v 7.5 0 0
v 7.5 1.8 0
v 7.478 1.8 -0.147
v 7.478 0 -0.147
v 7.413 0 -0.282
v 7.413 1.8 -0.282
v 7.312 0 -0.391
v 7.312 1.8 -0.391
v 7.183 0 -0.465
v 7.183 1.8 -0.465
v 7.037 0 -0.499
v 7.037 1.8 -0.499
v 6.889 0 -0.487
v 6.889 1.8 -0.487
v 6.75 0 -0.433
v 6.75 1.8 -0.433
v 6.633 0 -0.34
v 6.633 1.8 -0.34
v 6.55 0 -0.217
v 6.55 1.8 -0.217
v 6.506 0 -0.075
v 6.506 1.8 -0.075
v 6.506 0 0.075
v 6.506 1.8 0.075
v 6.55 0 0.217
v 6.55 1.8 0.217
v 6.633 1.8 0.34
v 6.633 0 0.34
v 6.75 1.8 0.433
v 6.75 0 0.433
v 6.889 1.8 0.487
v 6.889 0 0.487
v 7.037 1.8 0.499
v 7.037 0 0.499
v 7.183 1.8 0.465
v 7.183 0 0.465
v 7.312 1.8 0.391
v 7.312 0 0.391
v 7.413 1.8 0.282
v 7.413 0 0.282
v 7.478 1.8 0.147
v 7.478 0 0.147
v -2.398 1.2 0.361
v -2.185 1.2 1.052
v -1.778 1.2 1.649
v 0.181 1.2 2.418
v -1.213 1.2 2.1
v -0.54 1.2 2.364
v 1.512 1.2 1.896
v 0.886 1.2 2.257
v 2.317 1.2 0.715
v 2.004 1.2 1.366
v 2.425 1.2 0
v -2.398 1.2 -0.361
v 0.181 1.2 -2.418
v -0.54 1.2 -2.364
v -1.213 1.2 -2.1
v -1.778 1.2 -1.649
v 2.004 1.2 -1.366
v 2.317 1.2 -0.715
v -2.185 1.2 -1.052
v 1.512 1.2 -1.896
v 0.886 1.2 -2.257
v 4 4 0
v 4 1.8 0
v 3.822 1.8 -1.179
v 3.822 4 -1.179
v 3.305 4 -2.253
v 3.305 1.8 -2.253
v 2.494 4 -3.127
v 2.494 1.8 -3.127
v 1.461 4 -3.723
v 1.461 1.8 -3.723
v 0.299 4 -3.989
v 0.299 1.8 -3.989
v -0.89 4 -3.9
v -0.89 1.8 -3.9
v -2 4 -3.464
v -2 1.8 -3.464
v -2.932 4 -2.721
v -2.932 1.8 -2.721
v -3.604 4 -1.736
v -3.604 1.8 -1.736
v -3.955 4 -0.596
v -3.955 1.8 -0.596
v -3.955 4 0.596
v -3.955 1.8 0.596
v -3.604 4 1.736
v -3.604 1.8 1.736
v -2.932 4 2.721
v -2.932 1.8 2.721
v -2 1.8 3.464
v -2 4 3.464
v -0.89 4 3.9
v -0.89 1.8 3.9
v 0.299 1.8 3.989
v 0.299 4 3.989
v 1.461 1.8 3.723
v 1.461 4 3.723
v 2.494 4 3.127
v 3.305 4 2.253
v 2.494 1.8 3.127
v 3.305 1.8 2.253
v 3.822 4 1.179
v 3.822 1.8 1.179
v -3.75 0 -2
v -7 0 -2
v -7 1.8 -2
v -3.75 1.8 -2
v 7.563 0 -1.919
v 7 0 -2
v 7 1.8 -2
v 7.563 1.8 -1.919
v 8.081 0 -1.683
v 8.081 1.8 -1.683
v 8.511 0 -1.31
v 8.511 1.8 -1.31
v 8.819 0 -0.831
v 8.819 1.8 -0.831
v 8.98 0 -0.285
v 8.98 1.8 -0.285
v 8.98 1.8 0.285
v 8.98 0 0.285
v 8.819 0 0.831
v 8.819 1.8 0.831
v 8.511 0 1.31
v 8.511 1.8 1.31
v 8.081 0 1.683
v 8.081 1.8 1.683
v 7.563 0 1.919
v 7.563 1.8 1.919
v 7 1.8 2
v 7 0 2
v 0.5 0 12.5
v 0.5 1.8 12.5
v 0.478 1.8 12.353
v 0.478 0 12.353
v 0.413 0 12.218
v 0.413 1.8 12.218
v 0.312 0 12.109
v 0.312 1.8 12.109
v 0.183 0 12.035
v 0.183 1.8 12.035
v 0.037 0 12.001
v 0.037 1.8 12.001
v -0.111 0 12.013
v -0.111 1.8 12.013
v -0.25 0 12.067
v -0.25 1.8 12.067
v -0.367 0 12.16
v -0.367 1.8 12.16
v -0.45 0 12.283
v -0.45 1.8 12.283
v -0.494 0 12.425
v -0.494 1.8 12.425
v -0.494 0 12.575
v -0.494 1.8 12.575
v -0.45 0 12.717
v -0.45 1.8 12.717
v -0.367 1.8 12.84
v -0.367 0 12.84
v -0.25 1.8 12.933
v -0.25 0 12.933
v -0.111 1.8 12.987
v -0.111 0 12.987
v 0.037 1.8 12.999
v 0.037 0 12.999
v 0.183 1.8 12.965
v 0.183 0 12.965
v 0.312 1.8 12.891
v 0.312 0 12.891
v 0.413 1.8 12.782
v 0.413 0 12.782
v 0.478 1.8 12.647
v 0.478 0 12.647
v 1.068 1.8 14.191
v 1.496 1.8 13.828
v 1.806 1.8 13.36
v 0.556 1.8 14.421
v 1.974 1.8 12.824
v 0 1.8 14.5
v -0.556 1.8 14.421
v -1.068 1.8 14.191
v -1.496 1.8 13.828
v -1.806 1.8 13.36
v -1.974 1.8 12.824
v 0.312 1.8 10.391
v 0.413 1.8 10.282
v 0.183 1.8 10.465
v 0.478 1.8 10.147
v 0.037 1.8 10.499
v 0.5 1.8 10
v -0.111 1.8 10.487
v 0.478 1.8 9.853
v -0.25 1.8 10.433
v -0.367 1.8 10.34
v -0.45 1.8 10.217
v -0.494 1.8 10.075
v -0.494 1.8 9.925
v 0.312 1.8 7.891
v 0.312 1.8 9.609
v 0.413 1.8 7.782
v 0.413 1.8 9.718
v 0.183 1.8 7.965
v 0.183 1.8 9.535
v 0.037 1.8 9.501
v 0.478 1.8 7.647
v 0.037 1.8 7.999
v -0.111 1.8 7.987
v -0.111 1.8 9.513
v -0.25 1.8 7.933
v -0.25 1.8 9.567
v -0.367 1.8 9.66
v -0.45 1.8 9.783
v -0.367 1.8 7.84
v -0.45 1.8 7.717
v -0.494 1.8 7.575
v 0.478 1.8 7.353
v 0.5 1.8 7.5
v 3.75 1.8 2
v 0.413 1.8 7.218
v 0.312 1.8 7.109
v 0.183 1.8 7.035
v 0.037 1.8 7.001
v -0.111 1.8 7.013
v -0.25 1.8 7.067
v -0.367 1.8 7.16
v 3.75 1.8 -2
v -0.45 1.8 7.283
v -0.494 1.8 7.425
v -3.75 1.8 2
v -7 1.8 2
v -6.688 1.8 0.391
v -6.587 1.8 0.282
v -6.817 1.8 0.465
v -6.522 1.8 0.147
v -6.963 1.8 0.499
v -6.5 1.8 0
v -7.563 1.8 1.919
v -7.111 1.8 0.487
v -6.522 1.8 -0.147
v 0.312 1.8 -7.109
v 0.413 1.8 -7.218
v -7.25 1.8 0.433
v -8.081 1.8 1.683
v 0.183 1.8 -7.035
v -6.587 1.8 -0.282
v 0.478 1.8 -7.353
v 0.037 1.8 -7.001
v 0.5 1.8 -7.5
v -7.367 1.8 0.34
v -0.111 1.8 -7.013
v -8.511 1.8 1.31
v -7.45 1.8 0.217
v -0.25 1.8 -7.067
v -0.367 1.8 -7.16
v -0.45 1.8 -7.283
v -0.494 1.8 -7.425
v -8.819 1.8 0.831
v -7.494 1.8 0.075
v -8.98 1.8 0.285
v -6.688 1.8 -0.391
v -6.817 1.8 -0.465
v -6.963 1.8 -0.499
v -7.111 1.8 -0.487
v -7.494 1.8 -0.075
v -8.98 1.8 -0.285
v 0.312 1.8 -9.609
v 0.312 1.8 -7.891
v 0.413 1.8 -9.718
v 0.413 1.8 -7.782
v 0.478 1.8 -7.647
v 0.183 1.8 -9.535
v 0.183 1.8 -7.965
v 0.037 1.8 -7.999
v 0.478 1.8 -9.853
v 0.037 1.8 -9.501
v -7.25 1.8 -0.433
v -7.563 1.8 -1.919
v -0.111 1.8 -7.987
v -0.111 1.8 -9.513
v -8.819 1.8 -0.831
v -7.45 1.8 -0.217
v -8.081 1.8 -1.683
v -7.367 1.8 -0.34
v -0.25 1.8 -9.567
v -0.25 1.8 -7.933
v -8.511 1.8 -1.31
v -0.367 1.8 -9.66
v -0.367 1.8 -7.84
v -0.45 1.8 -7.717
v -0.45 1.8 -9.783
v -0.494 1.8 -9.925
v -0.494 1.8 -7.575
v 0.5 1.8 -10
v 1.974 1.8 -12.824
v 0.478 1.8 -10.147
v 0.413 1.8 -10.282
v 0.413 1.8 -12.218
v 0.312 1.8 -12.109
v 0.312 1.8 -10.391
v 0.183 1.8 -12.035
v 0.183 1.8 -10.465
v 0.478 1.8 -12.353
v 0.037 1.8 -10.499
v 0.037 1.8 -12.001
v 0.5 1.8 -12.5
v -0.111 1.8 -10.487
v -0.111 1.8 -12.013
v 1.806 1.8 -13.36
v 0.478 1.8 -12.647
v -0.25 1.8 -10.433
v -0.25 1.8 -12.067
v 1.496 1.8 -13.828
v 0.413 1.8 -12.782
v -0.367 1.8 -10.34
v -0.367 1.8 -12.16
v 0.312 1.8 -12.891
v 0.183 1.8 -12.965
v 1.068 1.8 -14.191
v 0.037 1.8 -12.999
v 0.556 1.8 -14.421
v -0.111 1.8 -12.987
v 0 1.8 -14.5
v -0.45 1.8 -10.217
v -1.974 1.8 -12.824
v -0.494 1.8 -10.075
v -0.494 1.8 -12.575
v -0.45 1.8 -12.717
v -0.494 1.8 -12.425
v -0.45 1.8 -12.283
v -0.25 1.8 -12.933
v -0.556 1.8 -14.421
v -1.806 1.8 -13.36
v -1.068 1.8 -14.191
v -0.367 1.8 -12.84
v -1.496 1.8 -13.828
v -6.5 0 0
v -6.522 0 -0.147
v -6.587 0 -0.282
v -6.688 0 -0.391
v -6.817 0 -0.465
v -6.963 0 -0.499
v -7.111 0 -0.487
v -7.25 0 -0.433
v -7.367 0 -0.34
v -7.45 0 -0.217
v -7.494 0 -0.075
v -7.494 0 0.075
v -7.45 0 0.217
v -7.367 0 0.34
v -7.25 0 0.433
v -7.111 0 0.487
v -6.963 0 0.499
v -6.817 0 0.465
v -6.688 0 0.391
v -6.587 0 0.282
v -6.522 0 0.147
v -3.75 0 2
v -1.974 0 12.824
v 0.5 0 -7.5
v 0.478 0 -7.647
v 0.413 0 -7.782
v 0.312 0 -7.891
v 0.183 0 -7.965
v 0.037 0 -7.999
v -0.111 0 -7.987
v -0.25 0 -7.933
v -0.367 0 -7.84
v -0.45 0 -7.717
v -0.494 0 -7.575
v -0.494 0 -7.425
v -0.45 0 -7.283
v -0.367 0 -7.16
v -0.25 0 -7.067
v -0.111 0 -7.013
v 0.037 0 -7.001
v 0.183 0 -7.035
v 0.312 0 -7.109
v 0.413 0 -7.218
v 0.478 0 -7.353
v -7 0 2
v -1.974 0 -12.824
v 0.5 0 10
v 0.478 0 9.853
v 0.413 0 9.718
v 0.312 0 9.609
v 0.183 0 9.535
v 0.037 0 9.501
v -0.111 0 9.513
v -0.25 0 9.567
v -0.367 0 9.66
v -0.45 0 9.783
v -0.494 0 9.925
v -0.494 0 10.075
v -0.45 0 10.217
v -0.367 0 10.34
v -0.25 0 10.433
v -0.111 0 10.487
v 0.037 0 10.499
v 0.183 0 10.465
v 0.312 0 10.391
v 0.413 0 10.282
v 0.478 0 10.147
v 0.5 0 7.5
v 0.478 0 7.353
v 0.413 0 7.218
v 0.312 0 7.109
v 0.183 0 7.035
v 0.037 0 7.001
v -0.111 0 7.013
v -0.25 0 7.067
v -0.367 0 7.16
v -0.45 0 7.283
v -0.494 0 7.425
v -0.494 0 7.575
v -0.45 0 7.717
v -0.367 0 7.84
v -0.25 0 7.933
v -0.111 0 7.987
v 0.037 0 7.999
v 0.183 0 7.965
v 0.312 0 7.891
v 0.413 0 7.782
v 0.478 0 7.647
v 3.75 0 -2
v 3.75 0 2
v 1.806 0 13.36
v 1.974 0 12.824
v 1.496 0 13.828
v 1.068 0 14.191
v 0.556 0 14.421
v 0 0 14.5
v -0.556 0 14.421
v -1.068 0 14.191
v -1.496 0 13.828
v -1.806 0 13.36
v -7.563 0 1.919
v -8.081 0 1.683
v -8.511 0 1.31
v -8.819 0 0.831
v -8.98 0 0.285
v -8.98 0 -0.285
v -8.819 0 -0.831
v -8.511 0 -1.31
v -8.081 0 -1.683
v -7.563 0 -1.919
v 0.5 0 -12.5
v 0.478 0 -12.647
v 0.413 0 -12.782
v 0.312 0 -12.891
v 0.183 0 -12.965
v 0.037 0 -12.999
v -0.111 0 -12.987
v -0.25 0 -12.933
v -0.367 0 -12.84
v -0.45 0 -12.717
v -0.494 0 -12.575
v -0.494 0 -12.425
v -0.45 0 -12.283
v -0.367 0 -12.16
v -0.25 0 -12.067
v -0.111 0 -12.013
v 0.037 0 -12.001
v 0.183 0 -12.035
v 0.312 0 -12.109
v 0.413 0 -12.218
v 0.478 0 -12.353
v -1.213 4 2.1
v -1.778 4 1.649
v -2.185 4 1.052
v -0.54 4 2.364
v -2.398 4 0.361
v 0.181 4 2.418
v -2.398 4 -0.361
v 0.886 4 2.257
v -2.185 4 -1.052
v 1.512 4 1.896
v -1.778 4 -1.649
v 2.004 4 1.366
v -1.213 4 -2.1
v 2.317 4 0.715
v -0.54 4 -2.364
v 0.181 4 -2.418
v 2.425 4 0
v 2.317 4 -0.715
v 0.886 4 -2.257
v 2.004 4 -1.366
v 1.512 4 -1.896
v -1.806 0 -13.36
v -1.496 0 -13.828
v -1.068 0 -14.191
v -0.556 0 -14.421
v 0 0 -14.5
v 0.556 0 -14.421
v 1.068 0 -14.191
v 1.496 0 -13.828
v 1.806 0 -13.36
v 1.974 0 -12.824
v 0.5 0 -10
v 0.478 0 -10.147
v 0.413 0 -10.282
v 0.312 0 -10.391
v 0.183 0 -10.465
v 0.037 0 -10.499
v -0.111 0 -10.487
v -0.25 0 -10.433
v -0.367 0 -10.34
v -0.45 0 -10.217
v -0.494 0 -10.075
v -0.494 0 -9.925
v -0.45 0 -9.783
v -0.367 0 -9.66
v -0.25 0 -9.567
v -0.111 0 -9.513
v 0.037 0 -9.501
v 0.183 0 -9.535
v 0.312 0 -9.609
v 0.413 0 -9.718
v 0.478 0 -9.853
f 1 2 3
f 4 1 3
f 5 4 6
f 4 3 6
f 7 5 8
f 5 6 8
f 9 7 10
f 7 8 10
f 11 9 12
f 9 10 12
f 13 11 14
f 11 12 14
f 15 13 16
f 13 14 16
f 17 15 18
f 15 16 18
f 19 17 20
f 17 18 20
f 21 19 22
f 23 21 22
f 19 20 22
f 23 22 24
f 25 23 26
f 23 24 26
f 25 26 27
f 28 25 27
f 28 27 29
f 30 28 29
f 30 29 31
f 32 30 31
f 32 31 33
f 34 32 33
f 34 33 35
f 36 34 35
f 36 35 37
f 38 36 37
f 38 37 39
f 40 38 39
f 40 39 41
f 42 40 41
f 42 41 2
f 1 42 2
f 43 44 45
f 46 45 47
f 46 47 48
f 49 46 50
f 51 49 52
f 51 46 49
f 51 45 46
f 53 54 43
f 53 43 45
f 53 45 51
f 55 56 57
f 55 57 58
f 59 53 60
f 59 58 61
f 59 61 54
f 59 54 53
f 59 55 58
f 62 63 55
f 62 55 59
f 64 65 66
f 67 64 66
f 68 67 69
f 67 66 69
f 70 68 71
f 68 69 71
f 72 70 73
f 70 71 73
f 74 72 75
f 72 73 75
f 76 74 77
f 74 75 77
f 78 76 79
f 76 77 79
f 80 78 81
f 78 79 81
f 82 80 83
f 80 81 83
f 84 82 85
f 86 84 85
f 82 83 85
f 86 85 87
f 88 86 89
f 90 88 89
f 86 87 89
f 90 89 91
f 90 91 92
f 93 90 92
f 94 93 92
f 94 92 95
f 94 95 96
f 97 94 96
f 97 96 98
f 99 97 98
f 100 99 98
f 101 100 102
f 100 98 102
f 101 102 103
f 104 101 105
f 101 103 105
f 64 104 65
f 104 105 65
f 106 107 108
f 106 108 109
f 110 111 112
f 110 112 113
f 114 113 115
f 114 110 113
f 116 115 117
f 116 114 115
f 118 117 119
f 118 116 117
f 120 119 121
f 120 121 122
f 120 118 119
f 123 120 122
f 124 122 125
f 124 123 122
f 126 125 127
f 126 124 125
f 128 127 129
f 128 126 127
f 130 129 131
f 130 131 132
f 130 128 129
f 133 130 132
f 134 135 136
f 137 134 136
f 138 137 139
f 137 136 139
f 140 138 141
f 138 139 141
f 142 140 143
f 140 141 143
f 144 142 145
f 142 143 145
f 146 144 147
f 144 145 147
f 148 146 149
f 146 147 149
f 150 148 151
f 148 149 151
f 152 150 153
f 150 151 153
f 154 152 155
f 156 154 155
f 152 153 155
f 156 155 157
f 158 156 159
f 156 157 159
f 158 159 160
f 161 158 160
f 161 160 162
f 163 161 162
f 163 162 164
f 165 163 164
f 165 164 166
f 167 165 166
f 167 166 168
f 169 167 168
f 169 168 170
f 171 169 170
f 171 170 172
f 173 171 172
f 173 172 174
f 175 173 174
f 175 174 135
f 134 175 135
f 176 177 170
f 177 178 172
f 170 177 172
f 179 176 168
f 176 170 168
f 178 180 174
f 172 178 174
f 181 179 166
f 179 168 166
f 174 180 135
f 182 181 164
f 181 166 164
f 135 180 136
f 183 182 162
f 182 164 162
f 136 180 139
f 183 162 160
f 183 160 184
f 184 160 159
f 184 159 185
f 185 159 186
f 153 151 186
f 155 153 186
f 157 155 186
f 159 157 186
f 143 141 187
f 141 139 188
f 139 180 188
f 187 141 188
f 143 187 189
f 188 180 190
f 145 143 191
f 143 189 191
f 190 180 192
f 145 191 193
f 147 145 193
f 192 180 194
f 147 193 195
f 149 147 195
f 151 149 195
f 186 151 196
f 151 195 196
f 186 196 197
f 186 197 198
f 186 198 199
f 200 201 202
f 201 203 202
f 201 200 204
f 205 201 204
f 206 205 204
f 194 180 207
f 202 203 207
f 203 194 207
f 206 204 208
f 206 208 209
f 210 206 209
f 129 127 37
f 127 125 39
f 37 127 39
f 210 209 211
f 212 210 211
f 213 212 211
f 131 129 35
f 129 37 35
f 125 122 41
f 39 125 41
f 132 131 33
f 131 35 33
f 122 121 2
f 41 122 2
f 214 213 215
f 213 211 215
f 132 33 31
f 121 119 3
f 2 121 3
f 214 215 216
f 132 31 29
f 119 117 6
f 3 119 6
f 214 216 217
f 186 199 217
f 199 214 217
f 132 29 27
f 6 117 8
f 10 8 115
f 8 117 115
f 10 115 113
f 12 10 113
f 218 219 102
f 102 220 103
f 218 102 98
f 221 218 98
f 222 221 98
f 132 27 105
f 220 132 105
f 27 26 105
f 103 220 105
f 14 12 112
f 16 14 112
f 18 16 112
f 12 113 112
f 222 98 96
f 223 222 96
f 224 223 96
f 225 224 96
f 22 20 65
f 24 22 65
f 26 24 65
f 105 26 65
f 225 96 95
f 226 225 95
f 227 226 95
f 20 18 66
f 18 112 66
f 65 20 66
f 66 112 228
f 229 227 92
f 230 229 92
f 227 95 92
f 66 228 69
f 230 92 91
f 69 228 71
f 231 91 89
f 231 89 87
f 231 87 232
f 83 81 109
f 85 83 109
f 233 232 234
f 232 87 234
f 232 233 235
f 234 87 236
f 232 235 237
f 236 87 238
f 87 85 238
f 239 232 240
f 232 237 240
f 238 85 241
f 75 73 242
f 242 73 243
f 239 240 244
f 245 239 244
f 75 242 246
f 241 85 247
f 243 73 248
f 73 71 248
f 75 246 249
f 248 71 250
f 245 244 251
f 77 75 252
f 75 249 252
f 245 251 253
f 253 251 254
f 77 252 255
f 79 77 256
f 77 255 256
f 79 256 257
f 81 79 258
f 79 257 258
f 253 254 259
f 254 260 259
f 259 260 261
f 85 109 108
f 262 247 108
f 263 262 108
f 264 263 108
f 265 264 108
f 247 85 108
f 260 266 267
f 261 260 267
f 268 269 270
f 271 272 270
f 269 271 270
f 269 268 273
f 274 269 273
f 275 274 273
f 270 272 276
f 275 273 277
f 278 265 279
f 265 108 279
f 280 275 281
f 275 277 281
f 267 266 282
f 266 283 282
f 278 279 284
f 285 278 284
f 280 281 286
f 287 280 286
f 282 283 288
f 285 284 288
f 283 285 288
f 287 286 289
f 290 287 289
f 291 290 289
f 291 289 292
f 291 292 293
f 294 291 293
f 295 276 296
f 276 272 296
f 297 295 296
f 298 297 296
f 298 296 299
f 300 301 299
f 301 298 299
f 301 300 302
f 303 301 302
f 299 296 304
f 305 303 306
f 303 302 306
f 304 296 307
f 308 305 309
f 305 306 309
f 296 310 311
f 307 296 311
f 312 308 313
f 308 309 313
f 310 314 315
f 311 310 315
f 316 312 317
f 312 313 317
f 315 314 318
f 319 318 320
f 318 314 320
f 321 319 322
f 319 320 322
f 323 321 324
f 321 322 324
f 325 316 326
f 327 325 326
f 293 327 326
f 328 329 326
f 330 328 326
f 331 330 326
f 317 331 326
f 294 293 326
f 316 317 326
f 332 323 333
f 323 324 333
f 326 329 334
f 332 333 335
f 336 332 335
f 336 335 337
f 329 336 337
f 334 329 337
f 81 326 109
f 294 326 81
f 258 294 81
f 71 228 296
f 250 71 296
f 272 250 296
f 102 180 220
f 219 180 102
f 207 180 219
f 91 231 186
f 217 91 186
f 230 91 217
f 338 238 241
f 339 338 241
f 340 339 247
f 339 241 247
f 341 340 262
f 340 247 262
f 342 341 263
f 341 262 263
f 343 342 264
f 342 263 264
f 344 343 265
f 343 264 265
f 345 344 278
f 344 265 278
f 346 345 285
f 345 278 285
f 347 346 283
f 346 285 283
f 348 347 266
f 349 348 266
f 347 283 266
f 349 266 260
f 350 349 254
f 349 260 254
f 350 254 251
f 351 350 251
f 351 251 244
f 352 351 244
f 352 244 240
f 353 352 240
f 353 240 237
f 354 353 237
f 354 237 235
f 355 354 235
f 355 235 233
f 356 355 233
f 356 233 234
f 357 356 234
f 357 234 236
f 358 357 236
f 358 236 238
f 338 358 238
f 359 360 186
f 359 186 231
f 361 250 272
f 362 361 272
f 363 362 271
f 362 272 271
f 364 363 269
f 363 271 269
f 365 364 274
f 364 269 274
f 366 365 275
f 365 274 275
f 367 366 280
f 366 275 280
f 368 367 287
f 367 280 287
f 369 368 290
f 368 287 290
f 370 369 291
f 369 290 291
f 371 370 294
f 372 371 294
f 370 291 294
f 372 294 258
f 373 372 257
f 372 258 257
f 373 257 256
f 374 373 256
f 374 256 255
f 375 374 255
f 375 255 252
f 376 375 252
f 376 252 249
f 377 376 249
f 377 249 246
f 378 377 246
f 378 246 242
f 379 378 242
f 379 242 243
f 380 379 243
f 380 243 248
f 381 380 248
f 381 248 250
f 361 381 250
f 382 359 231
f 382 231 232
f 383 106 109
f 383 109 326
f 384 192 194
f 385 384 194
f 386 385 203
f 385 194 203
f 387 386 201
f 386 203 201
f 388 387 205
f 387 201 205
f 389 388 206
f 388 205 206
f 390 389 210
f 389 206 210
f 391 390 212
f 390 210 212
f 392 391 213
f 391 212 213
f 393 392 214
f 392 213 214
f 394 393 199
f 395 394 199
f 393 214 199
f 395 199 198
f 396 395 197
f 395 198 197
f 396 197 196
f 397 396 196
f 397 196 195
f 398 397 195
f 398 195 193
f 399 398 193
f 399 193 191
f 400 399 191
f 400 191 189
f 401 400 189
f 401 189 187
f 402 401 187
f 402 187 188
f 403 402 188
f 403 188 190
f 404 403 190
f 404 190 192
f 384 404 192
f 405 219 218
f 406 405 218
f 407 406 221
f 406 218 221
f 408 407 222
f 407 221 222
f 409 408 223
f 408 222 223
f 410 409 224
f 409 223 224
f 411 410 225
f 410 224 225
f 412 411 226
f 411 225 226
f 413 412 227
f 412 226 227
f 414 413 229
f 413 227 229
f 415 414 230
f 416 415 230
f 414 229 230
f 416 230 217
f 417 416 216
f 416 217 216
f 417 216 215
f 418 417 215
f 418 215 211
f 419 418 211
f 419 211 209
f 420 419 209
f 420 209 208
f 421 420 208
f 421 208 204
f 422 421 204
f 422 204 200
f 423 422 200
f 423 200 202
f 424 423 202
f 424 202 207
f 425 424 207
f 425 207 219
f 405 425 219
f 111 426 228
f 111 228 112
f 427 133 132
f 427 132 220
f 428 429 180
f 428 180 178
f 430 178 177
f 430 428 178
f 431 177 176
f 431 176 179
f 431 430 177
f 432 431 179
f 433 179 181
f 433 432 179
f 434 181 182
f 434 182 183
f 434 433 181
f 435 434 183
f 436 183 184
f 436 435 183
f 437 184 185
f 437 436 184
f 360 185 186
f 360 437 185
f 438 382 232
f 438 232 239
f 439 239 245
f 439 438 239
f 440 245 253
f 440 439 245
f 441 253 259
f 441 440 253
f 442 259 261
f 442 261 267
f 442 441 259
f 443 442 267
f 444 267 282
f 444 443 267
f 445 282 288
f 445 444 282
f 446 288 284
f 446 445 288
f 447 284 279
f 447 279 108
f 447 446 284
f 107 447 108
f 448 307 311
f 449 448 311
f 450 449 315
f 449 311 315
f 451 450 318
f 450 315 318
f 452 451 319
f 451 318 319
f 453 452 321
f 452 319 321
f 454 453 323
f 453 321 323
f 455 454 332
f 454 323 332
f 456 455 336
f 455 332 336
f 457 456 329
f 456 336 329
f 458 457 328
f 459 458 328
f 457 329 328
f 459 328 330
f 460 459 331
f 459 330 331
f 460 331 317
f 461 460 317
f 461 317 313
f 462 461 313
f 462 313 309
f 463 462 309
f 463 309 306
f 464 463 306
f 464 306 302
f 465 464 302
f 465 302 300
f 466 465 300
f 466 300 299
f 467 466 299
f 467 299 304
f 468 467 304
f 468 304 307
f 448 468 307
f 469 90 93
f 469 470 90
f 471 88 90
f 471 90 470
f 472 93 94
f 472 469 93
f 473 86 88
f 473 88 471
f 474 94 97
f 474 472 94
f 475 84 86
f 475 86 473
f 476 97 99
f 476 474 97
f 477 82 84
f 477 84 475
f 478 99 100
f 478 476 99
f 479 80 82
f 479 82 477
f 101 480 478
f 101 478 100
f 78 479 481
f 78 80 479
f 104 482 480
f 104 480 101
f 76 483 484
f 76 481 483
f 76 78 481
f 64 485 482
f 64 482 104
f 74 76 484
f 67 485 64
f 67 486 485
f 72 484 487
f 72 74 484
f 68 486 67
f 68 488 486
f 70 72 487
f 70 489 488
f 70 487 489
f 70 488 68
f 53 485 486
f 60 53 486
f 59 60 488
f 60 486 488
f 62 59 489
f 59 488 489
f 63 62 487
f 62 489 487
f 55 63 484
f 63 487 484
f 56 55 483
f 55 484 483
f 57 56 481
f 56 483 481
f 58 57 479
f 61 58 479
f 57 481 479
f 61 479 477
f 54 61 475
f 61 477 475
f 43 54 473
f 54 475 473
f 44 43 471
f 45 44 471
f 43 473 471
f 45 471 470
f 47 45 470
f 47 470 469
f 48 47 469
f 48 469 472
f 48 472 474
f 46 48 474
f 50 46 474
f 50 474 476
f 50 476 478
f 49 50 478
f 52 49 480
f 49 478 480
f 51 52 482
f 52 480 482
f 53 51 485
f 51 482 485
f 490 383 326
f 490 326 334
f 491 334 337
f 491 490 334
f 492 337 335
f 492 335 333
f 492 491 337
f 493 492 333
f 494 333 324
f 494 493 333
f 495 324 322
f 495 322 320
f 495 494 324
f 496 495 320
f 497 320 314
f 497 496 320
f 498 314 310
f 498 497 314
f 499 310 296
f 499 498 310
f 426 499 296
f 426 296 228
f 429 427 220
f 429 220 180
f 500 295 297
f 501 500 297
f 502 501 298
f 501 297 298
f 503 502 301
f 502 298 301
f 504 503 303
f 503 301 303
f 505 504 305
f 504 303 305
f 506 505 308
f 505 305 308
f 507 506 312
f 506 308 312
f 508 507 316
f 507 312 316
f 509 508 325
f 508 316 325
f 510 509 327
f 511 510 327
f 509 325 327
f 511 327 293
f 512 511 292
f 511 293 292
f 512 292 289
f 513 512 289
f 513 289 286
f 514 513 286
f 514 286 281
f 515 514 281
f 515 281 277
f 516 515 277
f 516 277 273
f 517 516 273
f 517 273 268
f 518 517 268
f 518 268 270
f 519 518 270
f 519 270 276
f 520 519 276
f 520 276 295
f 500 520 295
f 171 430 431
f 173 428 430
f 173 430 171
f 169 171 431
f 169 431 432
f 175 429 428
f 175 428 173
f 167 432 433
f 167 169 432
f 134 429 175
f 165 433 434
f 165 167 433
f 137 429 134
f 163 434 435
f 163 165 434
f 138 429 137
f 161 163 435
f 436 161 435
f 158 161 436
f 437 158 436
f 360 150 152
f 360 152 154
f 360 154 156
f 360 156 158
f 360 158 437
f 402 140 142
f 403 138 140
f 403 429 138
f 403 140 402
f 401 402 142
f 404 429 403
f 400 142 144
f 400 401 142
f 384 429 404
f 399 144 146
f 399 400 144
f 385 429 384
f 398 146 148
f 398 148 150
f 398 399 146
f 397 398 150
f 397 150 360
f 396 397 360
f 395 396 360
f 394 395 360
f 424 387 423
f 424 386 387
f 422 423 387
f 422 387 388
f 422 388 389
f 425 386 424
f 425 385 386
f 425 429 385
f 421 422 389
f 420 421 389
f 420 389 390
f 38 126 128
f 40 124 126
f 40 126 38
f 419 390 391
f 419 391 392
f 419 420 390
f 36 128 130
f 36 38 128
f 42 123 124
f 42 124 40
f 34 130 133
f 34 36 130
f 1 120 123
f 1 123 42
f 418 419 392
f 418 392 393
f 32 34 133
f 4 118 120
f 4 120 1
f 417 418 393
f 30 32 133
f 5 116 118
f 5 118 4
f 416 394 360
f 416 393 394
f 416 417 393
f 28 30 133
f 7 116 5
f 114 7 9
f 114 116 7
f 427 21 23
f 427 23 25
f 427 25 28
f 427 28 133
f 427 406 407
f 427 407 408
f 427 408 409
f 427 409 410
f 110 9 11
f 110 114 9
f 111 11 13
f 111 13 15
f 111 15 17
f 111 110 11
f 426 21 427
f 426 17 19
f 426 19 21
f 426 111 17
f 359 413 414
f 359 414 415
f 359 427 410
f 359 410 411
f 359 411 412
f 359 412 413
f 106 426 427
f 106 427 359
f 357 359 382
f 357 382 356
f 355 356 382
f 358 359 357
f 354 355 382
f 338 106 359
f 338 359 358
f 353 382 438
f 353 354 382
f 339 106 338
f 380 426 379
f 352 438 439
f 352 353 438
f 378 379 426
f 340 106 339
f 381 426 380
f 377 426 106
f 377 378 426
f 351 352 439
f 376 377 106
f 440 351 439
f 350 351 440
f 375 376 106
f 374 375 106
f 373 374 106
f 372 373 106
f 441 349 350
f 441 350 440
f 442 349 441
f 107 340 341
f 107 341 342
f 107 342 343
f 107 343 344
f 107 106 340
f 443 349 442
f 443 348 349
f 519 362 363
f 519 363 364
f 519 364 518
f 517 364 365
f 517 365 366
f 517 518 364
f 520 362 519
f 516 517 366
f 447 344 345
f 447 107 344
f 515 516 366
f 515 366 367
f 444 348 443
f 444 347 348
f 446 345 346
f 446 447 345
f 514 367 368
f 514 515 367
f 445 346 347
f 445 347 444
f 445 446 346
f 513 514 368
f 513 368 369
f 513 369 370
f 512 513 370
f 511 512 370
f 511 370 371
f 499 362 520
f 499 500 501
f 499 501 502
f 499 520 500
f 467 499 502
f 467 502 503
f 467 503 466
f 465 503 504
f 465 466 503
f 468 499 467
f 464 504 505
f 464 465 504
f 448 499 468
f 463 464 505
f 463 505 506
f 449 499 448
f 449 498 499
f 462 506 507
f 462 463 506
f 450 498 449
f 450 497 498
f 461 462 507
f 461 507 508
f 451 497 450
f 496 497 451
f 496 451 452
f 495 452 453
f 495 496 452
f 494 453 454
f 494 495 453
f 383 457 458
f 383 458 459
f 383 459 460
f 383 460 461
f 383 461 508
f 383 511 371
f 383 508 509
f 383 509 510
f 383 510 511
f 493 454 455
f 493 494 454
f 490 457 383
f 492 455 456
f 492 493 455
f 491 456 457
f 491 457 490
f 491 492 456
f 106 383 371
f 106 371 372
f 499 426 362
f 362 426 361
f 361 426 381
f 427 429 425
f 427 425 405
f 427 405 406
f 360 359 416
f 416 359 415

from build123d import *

# Parameters (mm, degrees)
BOSS_EXTRUDE1_DEPTH = 1.8
SKETCH2_R           = 4
BOSS_EXTRUDE2_DEPTH = 2.2
SKETCH3_R           = 2.425
CUT_EXTRUDE1_DEPTH  = 2.8
SKETCH4_R           = 0.5
CUT_EXTRUDE2_DEPTH  = 2.8


with BuildPart() as part:
    # Sketch1 → Boss-Extrude1 (new body)
    with BuildSketch(Plane(origin=(0, 0, 0), x_dir=(1, 0, 0), z_dir=(0, 1, 0))):
        with BuildLine():
            Line((-3.75, 2), (-1.973597307, 12.8239038))
            ThreePointArc((-1.973597307, 12.8239038), (0, 14.5), (1.973597307, 12.8239038))
            Line((1.973597307, 12.8239038), (3.75, 2))
            Line((3.75, 2), (7, 2))
            ThreePointArc((7, 2), (9, 0), (7, -2))
            Line((7, -2), (3.75, -2))
            Line((3.75, -2), (1.973597307, -12.8239038))
            ThreePointArc((1.973597307, -12.8239038), (0, -14.5), (-1.973597307, -12.8239038))
            Line((-1.973597307, -12.8239038), (-3.75, -2))
            Line((-3.75, -2), (-7, -2))
            ThreePointArc((-7, -2), (-9, 0), (-7, 2))
            Line((-7, 2), (-3.75, 2))
        make_face()
    extrude(amount=BOSS_EXTRUDE1_DEPTH)

    # Sketch2 → Boss-Extrude2 (add)
    with BuildSketch(Plane(origin=(0, 1.8, 0), x_dir=(1, 0, 0), z_dir=(0, 1, 0))):
        Circle(SKETCH2_R)
    extrude(amount=BOSS_EXTRUDE2_DEPTH)

    # Sketch3 → Cut-Extrude1 (cut)
    with BuildSketch(Plane(origin=(0, 4, 0), x_dir=(1, 0, 0), z_dir=(0, 1, 0))):
        Circle(SKETCH3_R)
    extrude(amount=-CUT_EXTRUDE1_DEPTH, mode=Mode.SUBTRACT)

    # Sketch4 → Cut-Extrude2 (cut, through all)
    with BuildSketch(Plane(origin=(0, 1.8, 0), x_dir=(1, 0, 0), z_dir=(0, 1, 0))):
        with Locations((-7, 0)):
            Circle(SKETCH4_R)
        with Locations((7, 0)):
            Circle(SKETCH4_R)
        with Locations((0, 7.5)):
            Circle(SKETCH4_R)
        with Locations((0, -7.5)):
            Circle(SKETCH4_R)
        with Locations((0, 10)):
            Circle(SKETCH4_R)
        with Locations((0, 12.5)):
            Circle(SKETCH4_R)
        with Locations((0, -10)):
            Circle(SKETCH4_R)
        with Locations((0, -12.5)):
            Circle(SKETCH4_R)
    extrude(amount=-CUT_EXTRUDE2_DEPTH, mode=Mode.SUBTRACT)


solid = part.part
